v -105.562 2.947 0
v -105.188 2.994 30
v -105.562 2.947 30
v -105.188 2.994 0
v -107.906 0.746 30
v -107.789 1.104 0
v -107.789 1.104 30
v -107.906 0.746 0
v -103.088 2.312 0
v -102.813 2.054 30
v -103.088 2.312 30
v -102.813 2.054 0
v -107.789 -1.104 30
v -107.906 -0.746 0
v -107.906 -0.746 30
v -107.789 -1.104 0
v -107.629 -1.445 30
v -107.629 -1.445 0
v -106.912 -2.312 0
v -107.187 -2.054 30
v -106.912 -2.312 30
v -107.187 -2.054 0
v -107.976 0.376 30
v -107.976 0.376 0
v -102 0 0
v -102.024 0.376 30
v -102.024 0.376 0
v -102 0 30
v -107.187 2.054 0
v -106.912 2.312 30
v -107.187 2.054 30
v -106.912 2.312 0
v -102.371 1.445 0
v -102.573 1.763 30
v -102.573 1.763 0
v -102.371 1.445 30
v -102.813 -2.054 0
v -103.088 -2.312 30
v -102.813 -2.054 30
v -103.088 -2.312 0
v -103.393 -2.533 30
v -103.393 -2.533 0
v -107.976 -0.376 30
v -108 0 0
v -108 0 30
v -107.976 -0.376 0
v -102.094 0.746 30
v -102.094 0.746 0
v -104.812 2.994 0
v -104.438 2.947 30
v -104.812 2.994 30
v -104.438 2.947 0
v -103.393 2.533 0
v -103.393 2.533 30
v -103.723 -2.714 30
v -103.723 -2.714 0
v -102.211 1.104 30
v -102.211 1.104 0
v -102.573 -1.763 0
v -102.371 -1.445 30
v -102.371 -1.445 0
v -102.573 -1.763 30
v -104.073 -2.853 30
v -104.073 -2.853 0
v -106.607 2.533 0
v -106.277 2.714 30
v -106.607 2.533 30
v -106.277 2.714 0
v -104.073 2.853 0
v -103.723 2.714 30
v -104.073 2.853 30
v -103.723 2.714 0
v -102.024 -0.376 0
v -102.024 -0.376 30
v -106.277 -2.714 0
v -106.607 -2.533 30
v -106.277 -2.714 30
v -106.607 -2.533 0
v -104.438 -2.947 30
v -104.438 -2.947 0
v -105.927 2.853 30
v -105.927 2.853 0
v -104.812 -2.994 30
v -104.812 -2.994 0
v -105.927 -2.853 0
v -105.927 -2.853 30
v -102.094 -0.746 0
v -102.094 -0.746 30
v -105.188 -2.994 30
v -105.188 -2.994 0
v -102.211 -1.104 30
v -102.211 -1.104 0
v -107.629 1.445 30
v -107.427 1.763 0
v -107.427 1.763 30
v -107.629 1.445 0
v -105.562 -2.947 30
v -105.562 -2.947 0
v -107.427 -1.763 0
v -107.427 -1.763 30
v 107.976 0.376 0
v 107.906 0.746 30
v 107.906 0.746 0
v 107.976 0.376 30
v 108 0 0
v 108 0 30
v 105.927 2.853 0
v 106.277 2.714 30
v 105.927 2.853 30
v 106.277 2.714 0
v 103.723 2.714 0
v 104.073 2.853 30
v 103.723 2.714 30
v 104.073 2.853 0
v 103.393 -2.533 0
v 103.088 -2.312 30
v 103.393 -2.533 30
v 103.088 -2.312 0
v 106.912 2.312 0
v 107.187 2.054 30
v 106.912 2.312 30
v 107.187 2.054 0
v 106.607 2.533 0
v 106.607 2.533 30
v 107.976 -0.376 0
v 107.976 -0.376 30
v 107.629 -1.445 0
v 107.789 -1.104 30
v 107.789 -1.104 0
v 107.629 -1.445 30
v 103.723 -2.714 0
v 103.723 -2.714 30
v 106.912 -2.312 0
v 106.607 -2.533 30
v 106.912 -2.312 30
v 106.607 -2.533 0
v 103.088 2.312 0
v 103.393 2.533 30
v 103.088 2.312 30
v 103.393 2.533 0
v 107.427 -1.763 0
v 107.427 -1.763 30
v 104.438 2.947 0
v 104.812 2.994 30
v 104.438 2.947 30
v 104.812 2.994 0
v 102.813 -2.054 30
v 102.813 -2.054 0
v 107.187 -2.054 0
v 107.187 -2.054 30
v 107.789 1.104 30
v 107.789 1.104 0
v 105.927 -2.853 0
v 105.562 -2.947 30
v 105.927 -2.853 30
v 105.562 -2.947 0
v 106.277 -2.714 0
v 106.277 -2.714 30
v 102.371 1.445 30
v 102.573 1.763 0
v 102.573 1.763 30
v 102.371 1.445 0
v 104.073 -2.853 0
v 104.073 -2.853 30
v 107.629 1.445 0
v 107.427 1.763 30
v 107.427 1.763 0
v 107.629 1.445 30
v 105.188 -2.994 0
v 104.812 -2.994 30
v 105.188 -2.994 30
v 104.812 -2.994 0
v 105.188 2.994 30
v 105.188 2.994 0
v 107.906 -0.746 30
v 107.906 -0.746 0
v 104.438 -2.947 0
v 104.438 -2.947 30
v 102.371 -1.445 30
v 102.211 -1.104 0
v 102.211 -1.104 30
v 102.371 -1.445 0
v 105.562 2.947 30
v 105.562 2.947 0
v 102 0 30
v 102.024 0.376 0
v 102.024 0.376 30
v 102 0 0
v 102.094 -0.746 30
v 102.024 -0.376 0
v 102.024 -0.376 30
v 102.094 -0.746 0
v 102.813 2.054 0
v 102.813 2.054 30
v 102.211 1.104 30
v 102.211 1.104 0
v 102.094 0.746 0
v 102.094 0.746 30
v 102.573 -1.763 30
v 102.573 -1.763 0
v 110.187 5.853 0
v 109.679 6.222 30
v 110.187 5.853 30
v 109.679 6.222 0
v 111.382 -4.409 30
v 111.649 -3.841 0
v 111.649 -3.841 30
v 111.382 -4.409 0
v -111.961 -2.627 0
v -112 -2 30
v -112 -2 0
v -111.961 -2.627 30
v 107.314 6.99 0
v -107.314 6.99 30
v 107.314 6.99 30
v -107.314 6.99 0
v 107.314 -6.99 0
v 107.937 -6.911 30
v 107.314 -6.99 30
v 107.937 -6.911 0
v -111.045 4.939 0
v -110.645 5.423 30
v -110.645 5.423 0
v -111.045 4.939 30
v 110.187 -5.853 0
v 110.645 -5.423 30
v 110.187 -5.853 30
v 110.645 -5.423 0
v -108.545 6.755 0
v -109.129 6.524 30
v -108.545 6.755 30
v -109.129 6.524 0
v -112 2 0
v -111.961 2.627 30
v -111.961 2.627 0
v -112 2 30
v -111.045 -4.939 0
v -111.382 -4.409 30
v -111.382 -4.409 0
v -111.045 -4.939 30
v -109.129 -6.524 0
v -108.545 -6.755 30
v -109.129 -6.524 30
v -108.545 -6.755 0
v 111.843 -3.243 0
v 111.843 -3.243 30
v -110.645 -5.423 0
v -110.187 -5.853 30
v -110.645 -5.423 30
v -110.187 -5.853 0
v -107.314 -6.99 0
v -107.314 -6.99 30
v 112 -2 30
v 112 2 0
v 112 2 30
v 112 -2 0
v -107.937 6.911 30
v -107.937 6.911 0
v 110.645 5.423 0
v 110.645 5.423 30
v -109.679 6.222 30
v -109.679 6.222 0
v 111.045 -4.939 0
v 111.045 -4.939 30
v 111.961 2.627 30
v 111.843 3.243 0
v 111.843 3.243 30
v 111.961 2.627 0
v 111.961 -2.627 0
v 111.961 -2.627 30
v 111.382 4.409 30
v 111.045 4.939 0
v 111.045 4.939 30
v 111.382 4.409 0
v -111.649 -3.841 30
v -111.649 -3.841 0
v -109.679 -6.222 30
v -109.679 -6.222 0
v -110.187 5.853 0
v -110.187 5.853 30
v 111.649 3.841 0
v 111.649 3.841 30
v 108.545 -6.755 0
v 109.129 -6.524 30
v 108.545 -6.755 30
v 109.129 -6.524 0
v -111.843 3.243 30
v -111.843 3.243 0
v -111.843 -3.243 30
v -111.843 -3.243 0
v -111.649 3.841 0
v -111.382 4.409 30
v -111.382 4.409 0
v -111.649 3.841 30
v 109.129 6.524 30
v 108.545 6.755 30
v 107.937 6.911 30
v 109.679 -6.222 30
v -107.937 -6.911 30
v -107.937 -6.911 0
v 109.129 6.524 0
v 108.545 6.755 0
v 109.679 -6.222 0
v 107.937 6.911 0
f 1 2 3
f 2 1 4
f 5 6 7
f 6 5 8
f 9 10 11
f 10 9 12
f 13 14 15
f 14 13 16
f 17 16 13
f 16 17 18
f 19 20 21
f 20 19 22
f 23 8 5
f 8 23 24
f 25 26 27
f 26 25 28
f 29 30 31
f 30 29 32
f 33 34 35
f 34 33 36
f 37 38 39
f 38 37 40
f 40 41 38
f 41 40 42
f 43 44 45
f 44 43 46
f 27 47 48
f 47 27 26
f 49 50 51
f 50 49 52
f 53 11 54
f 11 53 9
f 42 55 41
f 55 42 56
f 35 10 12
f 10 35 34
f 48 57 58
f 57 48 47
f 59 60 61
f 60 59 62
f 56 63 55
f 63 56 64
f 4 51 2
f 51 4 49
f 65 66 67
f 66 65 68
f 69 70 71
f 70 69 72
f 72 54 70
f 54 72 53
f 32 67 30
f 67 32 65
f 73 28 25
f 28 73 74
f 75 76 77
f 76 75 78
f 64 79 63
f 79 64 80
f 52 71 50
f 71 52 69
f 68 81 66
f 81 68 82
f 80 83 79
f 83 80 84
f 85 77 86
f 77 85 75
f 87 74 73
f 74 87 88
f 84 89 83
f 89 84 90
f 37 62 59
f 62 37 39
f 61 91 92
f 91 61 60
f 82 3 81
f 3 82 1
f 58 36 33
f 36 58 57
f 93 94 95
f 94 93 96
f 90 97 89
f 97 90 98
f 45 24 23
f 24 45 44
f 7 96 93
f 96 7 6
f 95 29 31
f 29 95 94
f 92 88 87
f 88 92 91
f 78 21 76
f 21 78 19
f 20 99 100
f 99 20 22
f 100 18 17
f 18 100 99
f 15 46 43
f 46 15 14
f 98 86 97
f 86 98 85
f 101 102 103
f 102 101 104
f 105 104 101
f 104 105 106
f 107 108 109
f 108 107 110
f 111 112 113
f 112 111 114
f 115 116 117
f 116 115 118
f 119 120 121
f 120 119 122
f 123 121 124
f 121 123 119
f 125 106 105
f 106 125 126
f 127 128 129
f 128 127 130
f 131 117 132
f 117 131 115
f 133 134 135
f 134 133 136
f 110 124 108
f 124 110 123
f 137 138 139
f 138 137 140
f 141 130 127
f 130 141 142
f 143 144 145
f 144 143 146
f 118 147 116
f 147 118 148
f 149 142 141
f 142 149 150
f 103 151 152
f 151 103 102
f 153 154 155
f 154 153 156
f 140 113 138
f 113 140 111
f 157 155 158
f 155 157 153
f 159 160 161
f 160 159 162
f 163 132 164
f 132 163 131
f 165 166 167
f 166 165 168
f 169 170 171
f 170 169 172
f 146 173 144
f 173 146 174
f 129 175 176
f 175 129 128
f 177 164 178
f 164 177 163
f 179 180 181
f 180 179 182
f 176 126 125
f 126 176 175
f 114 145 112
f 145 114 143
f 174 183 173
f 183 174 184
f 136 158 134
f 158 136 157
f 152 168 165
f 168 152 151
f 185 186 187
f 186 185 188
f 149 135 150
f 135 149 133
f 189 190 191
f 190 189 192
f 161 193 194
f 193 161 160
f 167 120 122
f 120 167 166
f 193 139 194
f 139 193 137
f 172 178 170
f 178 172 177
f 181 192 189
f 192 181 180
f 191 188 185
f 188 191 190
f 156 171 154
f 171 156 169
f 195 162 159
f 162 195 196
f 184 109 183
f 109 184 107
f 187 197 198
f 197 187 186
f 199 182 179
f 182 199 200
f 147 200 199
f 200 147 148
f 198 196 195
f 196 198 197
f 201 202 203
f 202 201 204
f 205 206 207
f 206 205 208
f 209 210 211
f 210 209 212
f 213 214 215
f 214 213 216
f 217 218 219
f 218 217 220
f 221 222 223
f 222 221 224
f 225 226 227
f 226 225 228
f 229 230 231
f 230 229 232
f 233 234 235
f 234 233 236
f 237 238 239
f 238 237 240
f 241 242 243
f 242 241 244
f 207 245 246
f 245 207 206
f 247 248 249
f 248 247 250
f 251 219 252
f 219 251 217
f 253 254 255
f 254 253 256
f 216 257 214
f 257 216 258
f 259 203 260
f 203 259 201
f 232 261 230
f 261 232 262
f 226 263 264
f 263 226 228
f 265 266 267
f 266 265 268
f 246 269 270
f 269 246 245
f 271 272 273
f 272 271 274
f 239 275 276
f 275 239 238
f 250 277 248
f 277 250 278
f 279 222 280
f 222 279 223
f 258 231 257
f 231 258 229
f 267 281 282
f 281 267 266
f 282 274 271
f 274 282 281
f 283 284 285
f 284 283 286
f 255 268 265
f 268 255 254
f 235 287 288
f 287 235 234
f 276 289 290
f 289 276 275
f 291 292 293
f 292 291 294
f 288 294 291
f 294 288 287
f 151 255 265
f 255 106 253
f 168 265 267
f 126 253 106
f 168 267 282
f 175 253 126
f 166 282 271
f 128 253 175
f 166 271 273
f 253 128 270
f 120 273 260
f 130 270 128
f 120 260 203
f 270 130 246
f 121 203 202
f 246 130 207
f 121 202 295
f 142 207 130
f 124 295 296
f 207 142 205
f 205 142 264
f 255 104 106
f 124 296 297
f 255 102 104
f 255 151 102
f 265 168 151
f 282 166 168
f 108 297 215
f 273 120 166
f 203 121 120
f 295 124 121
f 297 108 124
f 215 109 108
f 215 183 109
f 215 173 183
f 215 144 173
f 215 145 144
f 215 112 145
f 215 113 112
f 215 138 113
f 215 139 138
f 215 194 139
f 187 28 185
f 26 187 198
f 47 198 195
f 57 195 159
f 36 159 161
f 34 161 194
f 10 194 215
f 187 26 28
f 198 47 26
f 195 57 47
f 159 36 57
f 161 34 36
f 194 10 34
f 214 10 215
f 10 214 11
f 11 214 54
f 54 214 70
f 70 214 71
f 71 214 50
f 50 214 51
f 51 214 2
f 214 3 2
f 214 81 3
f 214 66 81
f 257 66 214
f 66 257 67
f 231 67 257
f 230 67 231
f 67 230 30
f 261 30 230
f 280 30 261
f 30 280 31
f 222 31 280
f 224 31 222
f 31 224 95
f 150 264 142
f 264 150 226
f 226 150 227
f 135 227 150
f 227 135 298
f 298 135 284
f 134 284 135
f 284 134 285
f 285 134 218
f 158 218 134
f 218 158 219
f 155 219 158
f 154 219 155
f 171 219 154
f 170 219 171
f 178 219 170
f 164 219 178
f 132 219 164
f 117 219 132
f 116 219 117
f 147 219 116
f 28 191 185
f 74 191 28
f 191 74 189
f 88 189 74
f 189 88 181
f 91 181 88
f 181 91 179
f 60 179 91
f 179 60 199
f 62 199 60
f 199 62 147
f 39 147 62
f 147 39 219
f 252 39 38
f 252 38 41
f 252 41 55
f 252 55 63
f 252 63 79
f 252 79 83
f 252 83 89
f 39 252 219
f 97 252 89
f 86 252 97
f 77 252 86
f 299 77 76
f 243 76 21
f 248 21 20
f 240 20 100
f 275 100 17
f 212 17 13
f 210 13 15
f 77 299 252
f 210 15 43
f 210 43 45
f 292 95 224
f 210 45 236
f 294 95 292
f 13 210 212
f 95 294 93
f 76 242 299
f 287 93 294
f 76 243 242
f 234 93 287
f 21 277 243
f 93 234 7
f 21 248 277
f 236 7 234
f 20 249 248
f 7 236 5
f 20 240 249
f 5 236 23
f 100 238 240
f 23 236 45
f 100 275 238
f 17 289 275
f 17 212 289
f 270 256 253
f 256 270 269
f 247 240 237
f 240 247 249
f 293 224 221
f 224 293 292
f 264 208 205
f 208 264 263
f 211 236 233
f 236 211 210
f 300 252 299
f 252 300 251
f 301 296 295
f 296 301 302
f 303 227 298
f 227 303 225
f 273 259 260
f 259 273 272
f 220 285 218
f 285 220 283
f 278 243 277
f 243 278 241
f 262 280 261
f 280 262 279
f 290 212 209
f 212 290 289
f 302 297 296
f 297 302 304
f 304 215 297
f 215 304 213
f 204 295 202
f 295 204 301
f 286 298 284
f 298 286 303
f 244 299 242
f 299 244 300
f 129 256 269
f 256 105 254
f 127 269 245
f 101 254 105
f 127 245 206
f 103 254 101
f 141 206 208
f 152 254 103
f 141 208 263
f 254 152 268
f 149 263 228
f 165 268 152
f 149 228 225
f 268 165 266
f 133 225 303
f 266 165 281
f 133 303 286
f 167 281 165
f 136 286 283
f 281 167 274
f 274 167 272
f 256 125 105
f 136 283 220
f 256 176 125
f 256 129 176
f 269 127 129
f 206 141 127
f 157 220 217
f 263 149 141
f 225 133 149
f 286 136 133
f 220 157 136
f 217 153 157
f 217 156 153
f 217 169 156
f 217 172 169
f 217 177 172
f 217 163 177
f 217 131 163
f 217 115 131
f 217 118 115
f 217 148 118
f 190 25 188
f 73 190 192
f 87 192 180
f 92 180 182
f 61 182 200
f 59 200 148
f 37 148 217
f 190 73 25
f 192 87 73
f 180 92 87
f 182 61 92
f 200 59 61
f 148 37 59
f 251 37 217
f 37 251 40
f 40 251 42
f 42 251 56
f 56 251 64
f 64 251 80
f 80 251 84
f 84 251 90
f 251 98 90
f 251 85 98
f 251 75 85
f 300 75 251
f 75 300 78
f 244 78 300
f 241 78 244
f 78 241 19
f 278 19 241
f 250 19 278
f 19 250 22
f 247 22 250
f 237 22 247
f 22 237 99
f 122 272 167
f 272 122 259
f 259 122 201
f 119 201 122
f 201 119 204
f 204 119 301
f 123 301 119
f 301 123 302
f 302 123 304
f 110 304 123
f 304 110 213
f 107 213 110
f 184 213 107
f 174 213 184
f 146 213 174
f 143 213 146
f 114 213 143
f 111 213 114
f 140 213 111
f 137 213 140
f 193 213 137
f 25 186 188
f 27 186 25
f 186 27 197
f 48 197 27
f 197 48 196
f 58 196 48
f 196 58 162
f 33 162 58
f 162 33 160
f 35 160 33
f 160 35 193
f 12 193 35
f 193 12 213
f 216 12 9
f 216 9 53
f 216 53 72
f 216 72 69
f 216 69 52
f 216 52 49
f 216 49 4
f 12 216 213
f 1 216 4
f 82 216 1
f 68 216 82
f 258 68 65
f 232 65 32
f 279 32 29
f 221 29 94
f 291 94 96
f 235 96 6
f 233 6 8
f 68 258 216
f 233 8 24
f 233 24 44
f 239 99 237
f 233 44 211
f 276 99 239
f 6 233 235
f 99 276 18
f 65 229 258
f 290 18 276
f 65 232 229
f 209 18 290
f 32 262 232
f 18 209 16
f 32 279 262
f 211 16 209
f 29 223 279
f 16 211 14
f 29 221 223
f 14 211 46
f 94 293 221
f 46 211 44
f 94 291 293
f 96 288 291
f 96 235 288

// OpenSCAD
$fn = 50;


difference() {
	union() {
		hull() {
			translate(v = [-107.0000000000, 2.0000000000, 0]) {
				cylinder(h = 30, r = 5);
			}
			translate(v = [107.0000000000, 2.0000000000, 0]) {
				cylinder(h = 30, r = 5);
			}
			translate(v = [-107.0000000000, -2.0000000000, 0]) {
				cylinder(h = 30, r = 5);
			}
			translate(v = [107.0000000000, -2.0000000000, 0]) {
				cylinder(h = 30, r = 5);
			}
		}
	}
	union() {
		translate(v = [-105.0000000000, 0.0000000000, -100.0000000000]) {
			cylinder(h = 200, r = 3.0000000000);
		}
		translate(v = [-105.0000000000, 0.0000000000, -100.0000000000]) {
			cylinder(h = 200, r = 3.0000000000);
		}
		translate(v = [105.0000000000, 0.0000000000, -100.0000000000]) {
			cylinder(h = 200, r = 3.0000000000);
		}
		translate(v = [105.0000000000, 0.0000000000, -100.0000000000]) {
			cylinder(h = 200, r = 3.0000000000);
		}
	}
}
